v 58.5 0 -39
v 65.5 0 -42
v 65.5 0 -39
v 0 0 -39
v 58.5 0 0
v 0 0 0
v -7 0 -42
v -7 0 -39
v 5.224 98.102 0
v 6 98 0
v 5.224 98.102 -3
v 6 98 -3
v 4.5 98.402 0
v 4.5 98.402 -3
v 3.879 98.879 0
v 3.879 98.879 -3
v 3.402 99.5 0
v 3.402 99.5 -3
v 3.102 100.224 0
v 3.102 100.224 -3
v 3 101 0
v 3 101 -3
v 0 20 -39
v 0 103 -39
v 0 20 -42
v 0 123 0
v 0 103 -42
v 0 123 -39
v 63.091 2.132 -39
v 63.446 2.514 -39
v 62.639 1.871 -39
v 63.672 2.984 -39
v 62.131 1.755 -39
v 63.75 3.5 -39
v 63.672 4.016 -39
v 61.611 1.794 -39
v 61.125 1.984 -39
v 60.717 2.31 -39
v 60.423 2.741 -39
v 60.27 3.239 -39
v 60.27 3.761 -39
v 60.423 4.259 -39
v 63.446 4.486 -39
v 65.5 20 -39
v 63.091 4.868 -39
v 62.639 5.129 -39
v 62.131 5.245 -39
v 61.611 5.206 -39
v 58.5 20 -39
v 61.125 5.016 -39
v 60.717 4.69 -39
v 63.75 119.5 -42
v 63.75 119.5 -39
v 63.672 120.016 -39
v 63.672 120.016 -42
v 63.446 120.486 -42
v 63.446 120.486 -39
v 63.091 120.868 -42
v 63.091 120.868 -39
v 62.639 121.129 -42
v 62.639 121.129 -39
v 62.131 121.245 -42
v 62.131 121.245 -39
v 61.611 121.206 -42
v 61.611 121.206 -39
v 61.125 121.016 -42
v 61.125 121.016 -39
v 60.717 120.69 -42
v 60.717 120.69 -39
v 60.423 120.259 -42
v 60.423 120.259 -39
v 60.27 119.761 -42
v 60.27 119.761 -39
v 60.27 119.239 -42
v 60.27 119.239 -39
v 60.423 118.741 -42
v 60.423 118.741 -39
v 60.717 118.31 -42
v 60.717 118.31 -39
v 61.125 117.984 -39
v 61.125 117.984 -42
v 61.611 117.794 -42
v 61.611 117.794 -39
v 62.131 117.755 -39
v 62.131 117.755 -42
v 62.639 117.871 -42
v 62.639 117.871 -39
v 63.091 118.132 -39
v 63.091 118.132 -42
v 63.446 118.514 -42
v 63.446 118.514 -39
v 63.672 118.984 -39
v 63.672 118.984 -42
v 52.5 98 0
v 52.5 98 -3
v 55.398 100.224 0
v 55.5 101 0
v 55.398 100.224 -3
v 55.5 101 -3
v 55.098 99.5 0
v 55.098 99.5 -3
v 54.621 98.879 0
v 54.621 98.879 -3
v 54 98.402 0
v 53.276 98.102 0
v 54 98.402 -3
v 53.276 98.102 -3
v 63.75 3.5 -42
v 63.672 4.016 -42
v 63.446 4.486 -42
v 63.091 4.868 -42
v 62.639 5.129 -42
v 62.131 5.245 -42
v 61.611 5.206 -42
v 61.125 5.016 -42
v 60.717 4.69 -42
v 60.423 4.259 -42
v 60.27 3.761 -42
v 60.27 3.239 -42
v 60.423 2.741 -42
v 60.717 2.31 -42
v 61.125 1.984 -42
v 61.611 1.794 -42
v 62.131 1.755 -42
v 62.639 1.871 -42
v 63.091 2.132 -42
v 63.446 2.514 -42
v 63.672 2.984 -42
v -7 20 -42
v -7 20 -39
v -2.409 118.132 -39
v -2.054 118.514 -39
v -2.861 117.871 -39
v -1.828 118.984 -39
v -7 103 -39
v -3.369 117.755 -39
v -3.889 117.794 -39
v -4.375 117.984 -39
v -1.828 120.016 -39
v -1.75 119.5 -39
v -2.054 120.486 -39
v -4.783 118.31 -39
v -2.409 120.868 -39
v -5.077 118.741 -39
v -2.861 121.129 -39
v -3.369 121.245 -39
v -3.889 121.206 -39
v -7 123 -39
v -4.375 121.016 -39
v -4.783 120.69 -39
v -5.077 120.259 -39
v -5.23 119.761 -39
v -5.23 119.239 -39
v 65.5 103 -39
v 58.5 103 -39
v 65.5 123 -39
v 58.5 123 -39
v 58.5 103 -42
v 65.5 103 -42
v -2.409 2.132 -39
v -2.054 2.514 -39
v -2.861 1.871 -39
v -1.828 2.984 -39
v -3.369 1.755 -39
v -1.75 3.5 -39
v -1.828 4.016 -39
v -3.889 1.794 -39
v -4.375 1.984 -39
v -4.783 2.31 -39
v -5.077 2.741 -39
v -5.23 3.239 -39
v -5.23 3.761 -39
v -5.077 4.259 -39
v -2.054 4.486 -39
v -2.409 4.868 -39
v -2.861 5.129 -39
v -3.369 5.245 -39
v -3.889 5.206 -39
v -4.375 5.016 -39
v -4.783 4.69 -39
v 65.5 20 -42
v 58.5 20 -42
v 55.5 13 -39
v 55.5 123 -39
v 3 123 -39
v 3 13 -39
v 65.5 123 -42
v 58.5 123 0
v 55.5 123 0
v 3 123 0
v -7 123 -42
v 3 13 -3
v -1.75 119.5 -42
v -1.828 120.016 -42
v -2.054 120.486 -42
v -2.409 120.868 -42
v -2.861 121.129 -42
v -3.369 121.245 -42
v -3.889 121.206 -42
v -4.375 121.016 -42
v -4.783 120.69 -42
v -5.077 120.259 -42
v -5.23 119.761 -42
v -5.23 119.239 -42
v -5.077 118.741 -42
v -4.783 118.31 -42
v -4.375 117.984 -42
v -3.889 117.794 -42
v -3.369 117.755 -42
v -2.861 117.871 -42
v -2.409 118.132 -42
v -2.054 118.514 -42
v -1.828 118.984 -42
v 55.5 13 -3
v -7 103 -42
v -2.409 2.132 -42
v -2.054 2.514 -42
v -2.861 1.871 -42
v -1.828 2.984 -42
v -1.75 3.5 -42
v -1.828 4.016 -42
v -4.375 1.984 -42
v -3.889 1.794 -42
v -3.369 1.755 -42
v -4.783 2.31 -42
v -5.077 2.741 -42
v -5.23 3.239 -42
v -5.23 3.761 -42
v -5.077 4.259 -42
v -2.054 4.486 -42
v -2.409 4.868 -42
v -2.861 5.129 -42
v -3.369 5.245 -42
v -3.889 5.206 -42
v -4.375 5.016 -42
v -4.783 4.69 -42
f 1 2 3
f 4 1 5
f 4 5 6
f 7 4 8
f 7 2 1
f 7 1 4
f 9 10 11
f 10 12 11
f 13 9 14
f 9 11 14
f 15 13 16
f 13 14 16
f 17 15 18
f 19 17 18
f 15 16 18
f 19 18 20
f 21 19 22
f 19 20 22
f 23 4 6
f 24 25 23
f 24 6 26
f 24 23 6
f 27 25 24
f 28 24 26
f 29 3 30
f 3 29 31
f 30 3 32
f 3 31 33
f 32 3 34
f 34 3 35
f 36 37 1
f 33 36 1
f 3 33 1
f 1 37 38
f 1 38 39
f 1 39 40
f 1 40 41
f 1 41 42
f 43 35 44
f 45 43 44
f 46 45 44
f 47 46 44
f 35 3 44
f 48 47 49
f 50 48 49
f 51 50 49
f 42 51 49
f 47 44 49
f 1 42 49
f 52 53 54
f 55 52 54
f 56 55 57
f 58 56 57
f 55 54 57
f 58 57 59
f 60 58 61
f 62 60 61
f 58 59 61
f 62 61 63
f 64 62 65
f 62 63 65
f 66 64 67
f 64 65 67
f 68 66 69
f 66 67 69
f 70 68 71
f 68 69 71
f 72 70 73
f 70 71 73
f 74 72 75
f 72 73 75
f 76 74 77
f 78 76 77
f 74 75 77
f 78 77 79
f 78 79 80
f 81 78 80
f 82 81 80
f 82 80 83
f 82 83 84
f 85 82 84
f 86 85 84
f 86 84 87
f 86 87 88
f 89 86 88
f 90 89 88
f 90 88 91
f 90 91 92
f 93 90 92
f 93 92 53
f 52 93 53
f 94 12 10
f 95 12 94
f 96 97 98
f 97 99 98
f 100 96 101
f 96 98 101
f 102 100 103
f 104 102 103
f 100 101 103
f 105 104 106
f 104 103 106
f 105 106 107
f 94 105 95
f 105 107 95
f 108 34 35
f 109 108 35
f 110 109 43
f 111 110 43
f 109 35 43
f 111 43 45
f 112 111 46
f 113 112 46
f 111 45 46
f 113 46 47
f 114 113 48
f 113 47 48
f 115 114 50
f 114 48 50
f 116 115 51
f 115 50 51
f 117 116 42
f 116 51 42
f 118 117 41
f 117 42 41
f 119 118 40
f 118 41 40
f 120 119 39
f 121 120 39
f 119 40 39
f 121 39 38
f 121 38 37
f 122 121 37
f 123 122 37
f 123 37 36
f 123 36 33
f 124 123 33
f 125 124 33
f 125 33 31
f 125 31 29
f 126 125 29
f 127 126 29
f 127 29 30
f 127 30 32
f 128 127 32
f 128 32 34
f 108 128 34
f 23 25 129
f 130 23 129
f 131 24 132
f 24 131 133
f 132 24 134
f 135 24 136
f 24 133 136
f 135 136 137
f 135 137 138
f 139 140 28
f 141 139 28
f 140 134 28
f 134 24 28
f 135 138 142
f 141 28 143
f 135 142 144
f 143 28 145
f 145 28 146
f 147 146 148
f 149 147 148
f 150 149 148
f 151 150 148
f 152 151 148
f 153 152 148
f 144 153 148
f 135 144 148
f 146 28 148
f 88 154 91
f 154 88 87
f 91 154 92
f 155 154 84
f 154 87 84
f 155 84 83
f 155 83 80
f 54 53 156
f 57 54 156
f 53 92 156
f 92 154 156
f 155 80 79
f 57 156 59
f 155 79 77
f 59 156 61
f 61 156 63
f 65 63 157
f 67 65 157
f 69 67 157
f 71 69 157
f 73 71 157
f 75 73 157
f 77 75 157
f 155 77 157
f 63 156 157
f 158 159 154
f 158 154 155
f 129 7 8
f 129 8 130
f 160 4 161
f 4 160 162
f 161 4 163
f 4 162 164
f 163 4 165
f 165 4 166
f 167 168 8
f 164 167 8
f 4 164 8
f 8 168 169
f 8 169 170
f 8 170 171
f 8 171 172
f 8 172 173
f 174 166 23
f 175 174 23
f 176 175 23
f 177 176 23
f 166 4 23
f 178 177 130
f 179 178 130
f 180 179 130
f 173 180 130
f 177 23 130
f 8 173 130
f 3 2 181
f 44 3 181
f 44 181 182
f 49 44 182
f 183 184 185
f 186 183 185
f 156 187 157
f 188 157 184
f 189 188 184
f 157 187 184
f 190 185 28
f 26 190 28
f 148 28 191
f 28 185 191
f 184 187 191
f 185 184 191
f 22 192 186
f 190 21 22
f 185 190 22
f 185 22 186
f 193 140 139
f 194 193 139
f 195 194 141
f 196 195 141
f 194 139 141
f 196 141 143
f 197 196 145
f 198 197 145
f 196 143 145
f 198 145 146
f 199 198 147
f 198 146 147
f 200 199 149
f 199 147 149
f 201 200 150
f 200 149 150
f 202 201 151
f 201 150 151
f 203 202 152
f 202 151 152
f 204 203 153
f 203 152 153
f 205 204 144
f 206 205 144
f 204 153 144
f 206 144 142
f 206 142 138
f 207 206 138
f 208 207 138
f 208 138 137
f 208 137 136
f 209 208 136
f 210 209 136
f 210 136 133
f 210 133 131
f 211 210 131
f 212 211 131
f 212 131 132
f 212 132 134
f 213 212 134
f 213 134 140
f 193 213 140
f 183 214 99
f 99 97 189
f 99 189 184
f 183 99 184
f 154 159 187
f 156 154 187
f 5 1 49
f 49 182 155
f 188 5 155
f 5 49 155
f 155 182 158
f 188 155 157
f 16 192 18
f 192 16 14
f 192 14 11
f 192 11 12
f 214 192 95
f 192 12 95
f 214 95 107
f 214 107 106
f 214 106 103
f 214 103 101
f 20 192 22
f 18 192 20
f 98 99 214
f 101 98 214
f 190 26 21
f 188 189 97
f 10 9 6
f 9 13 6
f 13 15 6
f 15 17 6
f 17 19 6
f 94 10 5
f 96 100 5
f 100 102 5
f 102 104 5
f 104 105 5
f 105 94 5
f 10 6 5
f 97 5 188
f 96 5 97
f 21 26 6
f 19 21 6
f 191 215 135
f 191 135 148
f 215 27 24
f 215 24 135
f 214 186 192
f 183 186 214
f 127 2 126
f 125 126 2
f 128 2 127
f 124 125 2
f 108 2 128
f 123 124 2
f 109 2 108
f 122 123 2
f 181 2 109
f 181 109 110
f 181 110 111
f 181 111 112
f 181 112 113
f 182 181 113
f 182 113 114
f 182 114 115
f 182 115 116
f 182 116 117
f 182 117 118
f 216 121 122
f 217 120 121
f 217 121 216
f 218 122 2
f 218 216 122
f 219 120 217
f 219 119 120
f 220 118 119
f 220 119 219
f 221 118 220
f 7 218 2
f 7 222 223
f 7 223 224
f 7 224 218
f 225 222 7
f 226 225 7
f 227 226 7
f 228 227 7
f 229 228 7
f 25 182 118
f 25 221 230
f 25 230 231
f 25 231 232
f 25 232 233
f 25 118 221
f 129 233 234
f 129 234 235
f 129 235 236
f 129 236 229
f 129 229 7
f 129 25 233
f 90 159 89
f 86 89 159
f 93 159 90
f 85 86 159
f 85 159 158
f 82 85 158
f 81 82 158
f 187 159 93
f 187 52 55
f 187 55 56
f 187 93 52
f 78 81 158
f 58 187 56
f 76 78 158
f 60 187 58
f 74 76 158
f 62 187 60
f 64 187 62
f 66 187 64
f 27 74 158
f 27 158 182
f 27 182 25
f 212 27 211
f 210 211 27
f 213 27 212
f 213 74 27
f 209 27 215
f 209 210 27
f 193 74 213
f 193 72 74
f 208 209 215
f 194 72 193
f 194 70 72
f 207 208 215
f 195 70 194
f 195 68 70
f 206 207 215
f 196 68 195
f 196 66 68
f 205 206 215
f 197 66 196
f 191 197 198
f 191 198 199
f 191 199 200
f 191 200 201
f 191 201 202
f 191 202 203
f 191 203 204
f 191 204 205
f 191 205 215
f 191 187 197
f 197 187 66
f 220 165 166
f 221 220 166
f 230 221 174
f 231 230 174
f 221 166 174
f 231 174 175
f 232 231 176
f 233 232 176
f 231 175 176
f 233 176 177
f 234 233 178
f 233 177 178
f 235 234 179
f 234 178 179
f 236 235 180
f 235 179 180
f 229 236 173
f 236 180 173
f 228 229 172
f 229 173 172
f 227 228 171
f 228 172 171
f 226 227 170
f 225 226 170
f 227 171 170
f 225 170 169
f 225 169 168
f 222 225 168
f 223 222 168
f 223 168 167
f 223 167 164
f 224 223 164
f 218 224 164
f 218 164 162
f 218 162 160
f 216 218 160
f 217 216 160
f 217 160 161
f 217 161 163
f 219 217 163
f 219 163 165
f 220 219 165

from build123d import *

# Parameters (mm, degrees)
SKETCH_1_W          = 58.5
SKETCH_1_H          = 42
EXTRUDE_1_DEPTH     = 123
CUT_EXTRUDE_1_DEPTH = 120
SKETCH_3_W          = 52.5
SKETCH_3_H          = 3
CUT_EXTRUDE_2_DEPTH = 25
FILLET_1_R          = 3
SKETCH_4_W          = 7
SKETCH_4_H          = 123
EXTRUDE_2_DEPTH     = 3
HOLE_WIZARD_1_D     = 3.5
SKETCH_7_2_W        = 7
SKETCH_7_2_H        = 83
CUT_EXTRUDE_3_DEPTH = 3
SKETCH_9_W          = 52.5
SKETCH_9_H          = 36
EXTRUDE_3_DEPTH     = 10


with BuildPart() as part:
    # 草图1 → 凸台-拉伸1 (new body)
    with BuildSketch(Plane(origin=(0, 0, 0), x_dir=(1, 0, 0), z_dir=(0, 1, 0))):
        with Locations((29.25, 21)):
            Rectangle(SKETCH_1_W, SKETCH_1_H)
    extrude(amount=EXTRUDE_1_DEPTH)

    # 草图2 → 切除-拉伸1 (cut)
    with BuildSketch(Plane(origin=(0, 123, 0), x_dir=(1, 0, 0), z_dir=(0, 1, 0))):
        Polygon((3, 3), (4.178571429, 3), (54.321428571, 39), (3, 39), align=None)
        Polygon((54.321428571, 39), (4.178571429, 3), (55.5, 3), (55.5, 39), align=None)
    extrude(amount=-CUT_EXTRUDE_1_DEPTH, mode=Mode.SUBTRACT)

    # 草图3 → 切除-拉伸2 (cut)
    with BuildSketch(Plane(origin=(0, 123, 0), x_dir=(1, 0, 0), z_dir=(0, 1, 0))):
        with Locations((29.25, 1.5)):
            Rectangle(SKETCH_3_W, SKETCH_3_H)
    extrude(amount=-CUT_EXTRUDE_2_DEPTH, mode=Mode.SUBTRACT)

    # 圆角1
    fillet_1_edges = [part.edges().sort_by_distance(p)[0] for p in [
        (3, 98, -1.5),
        (55.5, 98, -1.5),
    ]]
    fillet(fillet_1_edges, radius=FILLET_1_R)

    # 草图4 → 凸台-拉伸2 (add)
    with BuildSketch(Plane(origin=(0, 0, -42), x_dir=(-1, 0, 0), z_dir=(0, 0, -1))):
        with Locations((-62, 61.5)):
            Rectangle(SKETCH_4_W, SKETCH_4_H)
        with Locations((3.5, 61.5)):
            Rectangle(SKETCH_4_W, SKETCH_4_H)
    extrude(amount=-EXTRUDE_2_DEPTH)

    # 孔1 (through all)
    with Locations(Plane(origin=(0, 0, -42), x_dir=(-1, 0, 0), z_dir=(0, 0, -1))):
        with Locations((-62, 3.5), (3.5, 3.5), (3.5, 119.5), (-62, 119.5)):
            Hole(HOLE_WIZARD_1_D / 2)

    # Sketch 7 2 → 切除-拉伸3 (cut)
    with BuildSketch(Plane(origin=(0, 0, -42), x_dir=(-1, 0, 0), z_dir=(0, 0, -1))):
        with Locations((3.5, 61.5)):
            Rectangle(SKETCH_7_2_W, SKETCH_7_2_H)
        with Locations((-62, 61.5)):
            Rectangle(SKETCH_7_2_W, SKETCH_7_2_H)
    extrude(amount=-CUT_EXTRUDE_3_DEPTH, mode=Mode.SUBTRACT)

    # 草图9 → 凸台-拉伸3 (add)
    with BuildSketch(Plane(origin=(0, 3, 0), x_dir=(1, 0, 0), z_dir=(0, 1, 0))):
        with Locations((29.25, 21)):
            Rectangle(SKETCH_9_W, SKETCH_9_H)
    extrude(amount=EXTRUDE_3_DEPTH)


solid = part.part
